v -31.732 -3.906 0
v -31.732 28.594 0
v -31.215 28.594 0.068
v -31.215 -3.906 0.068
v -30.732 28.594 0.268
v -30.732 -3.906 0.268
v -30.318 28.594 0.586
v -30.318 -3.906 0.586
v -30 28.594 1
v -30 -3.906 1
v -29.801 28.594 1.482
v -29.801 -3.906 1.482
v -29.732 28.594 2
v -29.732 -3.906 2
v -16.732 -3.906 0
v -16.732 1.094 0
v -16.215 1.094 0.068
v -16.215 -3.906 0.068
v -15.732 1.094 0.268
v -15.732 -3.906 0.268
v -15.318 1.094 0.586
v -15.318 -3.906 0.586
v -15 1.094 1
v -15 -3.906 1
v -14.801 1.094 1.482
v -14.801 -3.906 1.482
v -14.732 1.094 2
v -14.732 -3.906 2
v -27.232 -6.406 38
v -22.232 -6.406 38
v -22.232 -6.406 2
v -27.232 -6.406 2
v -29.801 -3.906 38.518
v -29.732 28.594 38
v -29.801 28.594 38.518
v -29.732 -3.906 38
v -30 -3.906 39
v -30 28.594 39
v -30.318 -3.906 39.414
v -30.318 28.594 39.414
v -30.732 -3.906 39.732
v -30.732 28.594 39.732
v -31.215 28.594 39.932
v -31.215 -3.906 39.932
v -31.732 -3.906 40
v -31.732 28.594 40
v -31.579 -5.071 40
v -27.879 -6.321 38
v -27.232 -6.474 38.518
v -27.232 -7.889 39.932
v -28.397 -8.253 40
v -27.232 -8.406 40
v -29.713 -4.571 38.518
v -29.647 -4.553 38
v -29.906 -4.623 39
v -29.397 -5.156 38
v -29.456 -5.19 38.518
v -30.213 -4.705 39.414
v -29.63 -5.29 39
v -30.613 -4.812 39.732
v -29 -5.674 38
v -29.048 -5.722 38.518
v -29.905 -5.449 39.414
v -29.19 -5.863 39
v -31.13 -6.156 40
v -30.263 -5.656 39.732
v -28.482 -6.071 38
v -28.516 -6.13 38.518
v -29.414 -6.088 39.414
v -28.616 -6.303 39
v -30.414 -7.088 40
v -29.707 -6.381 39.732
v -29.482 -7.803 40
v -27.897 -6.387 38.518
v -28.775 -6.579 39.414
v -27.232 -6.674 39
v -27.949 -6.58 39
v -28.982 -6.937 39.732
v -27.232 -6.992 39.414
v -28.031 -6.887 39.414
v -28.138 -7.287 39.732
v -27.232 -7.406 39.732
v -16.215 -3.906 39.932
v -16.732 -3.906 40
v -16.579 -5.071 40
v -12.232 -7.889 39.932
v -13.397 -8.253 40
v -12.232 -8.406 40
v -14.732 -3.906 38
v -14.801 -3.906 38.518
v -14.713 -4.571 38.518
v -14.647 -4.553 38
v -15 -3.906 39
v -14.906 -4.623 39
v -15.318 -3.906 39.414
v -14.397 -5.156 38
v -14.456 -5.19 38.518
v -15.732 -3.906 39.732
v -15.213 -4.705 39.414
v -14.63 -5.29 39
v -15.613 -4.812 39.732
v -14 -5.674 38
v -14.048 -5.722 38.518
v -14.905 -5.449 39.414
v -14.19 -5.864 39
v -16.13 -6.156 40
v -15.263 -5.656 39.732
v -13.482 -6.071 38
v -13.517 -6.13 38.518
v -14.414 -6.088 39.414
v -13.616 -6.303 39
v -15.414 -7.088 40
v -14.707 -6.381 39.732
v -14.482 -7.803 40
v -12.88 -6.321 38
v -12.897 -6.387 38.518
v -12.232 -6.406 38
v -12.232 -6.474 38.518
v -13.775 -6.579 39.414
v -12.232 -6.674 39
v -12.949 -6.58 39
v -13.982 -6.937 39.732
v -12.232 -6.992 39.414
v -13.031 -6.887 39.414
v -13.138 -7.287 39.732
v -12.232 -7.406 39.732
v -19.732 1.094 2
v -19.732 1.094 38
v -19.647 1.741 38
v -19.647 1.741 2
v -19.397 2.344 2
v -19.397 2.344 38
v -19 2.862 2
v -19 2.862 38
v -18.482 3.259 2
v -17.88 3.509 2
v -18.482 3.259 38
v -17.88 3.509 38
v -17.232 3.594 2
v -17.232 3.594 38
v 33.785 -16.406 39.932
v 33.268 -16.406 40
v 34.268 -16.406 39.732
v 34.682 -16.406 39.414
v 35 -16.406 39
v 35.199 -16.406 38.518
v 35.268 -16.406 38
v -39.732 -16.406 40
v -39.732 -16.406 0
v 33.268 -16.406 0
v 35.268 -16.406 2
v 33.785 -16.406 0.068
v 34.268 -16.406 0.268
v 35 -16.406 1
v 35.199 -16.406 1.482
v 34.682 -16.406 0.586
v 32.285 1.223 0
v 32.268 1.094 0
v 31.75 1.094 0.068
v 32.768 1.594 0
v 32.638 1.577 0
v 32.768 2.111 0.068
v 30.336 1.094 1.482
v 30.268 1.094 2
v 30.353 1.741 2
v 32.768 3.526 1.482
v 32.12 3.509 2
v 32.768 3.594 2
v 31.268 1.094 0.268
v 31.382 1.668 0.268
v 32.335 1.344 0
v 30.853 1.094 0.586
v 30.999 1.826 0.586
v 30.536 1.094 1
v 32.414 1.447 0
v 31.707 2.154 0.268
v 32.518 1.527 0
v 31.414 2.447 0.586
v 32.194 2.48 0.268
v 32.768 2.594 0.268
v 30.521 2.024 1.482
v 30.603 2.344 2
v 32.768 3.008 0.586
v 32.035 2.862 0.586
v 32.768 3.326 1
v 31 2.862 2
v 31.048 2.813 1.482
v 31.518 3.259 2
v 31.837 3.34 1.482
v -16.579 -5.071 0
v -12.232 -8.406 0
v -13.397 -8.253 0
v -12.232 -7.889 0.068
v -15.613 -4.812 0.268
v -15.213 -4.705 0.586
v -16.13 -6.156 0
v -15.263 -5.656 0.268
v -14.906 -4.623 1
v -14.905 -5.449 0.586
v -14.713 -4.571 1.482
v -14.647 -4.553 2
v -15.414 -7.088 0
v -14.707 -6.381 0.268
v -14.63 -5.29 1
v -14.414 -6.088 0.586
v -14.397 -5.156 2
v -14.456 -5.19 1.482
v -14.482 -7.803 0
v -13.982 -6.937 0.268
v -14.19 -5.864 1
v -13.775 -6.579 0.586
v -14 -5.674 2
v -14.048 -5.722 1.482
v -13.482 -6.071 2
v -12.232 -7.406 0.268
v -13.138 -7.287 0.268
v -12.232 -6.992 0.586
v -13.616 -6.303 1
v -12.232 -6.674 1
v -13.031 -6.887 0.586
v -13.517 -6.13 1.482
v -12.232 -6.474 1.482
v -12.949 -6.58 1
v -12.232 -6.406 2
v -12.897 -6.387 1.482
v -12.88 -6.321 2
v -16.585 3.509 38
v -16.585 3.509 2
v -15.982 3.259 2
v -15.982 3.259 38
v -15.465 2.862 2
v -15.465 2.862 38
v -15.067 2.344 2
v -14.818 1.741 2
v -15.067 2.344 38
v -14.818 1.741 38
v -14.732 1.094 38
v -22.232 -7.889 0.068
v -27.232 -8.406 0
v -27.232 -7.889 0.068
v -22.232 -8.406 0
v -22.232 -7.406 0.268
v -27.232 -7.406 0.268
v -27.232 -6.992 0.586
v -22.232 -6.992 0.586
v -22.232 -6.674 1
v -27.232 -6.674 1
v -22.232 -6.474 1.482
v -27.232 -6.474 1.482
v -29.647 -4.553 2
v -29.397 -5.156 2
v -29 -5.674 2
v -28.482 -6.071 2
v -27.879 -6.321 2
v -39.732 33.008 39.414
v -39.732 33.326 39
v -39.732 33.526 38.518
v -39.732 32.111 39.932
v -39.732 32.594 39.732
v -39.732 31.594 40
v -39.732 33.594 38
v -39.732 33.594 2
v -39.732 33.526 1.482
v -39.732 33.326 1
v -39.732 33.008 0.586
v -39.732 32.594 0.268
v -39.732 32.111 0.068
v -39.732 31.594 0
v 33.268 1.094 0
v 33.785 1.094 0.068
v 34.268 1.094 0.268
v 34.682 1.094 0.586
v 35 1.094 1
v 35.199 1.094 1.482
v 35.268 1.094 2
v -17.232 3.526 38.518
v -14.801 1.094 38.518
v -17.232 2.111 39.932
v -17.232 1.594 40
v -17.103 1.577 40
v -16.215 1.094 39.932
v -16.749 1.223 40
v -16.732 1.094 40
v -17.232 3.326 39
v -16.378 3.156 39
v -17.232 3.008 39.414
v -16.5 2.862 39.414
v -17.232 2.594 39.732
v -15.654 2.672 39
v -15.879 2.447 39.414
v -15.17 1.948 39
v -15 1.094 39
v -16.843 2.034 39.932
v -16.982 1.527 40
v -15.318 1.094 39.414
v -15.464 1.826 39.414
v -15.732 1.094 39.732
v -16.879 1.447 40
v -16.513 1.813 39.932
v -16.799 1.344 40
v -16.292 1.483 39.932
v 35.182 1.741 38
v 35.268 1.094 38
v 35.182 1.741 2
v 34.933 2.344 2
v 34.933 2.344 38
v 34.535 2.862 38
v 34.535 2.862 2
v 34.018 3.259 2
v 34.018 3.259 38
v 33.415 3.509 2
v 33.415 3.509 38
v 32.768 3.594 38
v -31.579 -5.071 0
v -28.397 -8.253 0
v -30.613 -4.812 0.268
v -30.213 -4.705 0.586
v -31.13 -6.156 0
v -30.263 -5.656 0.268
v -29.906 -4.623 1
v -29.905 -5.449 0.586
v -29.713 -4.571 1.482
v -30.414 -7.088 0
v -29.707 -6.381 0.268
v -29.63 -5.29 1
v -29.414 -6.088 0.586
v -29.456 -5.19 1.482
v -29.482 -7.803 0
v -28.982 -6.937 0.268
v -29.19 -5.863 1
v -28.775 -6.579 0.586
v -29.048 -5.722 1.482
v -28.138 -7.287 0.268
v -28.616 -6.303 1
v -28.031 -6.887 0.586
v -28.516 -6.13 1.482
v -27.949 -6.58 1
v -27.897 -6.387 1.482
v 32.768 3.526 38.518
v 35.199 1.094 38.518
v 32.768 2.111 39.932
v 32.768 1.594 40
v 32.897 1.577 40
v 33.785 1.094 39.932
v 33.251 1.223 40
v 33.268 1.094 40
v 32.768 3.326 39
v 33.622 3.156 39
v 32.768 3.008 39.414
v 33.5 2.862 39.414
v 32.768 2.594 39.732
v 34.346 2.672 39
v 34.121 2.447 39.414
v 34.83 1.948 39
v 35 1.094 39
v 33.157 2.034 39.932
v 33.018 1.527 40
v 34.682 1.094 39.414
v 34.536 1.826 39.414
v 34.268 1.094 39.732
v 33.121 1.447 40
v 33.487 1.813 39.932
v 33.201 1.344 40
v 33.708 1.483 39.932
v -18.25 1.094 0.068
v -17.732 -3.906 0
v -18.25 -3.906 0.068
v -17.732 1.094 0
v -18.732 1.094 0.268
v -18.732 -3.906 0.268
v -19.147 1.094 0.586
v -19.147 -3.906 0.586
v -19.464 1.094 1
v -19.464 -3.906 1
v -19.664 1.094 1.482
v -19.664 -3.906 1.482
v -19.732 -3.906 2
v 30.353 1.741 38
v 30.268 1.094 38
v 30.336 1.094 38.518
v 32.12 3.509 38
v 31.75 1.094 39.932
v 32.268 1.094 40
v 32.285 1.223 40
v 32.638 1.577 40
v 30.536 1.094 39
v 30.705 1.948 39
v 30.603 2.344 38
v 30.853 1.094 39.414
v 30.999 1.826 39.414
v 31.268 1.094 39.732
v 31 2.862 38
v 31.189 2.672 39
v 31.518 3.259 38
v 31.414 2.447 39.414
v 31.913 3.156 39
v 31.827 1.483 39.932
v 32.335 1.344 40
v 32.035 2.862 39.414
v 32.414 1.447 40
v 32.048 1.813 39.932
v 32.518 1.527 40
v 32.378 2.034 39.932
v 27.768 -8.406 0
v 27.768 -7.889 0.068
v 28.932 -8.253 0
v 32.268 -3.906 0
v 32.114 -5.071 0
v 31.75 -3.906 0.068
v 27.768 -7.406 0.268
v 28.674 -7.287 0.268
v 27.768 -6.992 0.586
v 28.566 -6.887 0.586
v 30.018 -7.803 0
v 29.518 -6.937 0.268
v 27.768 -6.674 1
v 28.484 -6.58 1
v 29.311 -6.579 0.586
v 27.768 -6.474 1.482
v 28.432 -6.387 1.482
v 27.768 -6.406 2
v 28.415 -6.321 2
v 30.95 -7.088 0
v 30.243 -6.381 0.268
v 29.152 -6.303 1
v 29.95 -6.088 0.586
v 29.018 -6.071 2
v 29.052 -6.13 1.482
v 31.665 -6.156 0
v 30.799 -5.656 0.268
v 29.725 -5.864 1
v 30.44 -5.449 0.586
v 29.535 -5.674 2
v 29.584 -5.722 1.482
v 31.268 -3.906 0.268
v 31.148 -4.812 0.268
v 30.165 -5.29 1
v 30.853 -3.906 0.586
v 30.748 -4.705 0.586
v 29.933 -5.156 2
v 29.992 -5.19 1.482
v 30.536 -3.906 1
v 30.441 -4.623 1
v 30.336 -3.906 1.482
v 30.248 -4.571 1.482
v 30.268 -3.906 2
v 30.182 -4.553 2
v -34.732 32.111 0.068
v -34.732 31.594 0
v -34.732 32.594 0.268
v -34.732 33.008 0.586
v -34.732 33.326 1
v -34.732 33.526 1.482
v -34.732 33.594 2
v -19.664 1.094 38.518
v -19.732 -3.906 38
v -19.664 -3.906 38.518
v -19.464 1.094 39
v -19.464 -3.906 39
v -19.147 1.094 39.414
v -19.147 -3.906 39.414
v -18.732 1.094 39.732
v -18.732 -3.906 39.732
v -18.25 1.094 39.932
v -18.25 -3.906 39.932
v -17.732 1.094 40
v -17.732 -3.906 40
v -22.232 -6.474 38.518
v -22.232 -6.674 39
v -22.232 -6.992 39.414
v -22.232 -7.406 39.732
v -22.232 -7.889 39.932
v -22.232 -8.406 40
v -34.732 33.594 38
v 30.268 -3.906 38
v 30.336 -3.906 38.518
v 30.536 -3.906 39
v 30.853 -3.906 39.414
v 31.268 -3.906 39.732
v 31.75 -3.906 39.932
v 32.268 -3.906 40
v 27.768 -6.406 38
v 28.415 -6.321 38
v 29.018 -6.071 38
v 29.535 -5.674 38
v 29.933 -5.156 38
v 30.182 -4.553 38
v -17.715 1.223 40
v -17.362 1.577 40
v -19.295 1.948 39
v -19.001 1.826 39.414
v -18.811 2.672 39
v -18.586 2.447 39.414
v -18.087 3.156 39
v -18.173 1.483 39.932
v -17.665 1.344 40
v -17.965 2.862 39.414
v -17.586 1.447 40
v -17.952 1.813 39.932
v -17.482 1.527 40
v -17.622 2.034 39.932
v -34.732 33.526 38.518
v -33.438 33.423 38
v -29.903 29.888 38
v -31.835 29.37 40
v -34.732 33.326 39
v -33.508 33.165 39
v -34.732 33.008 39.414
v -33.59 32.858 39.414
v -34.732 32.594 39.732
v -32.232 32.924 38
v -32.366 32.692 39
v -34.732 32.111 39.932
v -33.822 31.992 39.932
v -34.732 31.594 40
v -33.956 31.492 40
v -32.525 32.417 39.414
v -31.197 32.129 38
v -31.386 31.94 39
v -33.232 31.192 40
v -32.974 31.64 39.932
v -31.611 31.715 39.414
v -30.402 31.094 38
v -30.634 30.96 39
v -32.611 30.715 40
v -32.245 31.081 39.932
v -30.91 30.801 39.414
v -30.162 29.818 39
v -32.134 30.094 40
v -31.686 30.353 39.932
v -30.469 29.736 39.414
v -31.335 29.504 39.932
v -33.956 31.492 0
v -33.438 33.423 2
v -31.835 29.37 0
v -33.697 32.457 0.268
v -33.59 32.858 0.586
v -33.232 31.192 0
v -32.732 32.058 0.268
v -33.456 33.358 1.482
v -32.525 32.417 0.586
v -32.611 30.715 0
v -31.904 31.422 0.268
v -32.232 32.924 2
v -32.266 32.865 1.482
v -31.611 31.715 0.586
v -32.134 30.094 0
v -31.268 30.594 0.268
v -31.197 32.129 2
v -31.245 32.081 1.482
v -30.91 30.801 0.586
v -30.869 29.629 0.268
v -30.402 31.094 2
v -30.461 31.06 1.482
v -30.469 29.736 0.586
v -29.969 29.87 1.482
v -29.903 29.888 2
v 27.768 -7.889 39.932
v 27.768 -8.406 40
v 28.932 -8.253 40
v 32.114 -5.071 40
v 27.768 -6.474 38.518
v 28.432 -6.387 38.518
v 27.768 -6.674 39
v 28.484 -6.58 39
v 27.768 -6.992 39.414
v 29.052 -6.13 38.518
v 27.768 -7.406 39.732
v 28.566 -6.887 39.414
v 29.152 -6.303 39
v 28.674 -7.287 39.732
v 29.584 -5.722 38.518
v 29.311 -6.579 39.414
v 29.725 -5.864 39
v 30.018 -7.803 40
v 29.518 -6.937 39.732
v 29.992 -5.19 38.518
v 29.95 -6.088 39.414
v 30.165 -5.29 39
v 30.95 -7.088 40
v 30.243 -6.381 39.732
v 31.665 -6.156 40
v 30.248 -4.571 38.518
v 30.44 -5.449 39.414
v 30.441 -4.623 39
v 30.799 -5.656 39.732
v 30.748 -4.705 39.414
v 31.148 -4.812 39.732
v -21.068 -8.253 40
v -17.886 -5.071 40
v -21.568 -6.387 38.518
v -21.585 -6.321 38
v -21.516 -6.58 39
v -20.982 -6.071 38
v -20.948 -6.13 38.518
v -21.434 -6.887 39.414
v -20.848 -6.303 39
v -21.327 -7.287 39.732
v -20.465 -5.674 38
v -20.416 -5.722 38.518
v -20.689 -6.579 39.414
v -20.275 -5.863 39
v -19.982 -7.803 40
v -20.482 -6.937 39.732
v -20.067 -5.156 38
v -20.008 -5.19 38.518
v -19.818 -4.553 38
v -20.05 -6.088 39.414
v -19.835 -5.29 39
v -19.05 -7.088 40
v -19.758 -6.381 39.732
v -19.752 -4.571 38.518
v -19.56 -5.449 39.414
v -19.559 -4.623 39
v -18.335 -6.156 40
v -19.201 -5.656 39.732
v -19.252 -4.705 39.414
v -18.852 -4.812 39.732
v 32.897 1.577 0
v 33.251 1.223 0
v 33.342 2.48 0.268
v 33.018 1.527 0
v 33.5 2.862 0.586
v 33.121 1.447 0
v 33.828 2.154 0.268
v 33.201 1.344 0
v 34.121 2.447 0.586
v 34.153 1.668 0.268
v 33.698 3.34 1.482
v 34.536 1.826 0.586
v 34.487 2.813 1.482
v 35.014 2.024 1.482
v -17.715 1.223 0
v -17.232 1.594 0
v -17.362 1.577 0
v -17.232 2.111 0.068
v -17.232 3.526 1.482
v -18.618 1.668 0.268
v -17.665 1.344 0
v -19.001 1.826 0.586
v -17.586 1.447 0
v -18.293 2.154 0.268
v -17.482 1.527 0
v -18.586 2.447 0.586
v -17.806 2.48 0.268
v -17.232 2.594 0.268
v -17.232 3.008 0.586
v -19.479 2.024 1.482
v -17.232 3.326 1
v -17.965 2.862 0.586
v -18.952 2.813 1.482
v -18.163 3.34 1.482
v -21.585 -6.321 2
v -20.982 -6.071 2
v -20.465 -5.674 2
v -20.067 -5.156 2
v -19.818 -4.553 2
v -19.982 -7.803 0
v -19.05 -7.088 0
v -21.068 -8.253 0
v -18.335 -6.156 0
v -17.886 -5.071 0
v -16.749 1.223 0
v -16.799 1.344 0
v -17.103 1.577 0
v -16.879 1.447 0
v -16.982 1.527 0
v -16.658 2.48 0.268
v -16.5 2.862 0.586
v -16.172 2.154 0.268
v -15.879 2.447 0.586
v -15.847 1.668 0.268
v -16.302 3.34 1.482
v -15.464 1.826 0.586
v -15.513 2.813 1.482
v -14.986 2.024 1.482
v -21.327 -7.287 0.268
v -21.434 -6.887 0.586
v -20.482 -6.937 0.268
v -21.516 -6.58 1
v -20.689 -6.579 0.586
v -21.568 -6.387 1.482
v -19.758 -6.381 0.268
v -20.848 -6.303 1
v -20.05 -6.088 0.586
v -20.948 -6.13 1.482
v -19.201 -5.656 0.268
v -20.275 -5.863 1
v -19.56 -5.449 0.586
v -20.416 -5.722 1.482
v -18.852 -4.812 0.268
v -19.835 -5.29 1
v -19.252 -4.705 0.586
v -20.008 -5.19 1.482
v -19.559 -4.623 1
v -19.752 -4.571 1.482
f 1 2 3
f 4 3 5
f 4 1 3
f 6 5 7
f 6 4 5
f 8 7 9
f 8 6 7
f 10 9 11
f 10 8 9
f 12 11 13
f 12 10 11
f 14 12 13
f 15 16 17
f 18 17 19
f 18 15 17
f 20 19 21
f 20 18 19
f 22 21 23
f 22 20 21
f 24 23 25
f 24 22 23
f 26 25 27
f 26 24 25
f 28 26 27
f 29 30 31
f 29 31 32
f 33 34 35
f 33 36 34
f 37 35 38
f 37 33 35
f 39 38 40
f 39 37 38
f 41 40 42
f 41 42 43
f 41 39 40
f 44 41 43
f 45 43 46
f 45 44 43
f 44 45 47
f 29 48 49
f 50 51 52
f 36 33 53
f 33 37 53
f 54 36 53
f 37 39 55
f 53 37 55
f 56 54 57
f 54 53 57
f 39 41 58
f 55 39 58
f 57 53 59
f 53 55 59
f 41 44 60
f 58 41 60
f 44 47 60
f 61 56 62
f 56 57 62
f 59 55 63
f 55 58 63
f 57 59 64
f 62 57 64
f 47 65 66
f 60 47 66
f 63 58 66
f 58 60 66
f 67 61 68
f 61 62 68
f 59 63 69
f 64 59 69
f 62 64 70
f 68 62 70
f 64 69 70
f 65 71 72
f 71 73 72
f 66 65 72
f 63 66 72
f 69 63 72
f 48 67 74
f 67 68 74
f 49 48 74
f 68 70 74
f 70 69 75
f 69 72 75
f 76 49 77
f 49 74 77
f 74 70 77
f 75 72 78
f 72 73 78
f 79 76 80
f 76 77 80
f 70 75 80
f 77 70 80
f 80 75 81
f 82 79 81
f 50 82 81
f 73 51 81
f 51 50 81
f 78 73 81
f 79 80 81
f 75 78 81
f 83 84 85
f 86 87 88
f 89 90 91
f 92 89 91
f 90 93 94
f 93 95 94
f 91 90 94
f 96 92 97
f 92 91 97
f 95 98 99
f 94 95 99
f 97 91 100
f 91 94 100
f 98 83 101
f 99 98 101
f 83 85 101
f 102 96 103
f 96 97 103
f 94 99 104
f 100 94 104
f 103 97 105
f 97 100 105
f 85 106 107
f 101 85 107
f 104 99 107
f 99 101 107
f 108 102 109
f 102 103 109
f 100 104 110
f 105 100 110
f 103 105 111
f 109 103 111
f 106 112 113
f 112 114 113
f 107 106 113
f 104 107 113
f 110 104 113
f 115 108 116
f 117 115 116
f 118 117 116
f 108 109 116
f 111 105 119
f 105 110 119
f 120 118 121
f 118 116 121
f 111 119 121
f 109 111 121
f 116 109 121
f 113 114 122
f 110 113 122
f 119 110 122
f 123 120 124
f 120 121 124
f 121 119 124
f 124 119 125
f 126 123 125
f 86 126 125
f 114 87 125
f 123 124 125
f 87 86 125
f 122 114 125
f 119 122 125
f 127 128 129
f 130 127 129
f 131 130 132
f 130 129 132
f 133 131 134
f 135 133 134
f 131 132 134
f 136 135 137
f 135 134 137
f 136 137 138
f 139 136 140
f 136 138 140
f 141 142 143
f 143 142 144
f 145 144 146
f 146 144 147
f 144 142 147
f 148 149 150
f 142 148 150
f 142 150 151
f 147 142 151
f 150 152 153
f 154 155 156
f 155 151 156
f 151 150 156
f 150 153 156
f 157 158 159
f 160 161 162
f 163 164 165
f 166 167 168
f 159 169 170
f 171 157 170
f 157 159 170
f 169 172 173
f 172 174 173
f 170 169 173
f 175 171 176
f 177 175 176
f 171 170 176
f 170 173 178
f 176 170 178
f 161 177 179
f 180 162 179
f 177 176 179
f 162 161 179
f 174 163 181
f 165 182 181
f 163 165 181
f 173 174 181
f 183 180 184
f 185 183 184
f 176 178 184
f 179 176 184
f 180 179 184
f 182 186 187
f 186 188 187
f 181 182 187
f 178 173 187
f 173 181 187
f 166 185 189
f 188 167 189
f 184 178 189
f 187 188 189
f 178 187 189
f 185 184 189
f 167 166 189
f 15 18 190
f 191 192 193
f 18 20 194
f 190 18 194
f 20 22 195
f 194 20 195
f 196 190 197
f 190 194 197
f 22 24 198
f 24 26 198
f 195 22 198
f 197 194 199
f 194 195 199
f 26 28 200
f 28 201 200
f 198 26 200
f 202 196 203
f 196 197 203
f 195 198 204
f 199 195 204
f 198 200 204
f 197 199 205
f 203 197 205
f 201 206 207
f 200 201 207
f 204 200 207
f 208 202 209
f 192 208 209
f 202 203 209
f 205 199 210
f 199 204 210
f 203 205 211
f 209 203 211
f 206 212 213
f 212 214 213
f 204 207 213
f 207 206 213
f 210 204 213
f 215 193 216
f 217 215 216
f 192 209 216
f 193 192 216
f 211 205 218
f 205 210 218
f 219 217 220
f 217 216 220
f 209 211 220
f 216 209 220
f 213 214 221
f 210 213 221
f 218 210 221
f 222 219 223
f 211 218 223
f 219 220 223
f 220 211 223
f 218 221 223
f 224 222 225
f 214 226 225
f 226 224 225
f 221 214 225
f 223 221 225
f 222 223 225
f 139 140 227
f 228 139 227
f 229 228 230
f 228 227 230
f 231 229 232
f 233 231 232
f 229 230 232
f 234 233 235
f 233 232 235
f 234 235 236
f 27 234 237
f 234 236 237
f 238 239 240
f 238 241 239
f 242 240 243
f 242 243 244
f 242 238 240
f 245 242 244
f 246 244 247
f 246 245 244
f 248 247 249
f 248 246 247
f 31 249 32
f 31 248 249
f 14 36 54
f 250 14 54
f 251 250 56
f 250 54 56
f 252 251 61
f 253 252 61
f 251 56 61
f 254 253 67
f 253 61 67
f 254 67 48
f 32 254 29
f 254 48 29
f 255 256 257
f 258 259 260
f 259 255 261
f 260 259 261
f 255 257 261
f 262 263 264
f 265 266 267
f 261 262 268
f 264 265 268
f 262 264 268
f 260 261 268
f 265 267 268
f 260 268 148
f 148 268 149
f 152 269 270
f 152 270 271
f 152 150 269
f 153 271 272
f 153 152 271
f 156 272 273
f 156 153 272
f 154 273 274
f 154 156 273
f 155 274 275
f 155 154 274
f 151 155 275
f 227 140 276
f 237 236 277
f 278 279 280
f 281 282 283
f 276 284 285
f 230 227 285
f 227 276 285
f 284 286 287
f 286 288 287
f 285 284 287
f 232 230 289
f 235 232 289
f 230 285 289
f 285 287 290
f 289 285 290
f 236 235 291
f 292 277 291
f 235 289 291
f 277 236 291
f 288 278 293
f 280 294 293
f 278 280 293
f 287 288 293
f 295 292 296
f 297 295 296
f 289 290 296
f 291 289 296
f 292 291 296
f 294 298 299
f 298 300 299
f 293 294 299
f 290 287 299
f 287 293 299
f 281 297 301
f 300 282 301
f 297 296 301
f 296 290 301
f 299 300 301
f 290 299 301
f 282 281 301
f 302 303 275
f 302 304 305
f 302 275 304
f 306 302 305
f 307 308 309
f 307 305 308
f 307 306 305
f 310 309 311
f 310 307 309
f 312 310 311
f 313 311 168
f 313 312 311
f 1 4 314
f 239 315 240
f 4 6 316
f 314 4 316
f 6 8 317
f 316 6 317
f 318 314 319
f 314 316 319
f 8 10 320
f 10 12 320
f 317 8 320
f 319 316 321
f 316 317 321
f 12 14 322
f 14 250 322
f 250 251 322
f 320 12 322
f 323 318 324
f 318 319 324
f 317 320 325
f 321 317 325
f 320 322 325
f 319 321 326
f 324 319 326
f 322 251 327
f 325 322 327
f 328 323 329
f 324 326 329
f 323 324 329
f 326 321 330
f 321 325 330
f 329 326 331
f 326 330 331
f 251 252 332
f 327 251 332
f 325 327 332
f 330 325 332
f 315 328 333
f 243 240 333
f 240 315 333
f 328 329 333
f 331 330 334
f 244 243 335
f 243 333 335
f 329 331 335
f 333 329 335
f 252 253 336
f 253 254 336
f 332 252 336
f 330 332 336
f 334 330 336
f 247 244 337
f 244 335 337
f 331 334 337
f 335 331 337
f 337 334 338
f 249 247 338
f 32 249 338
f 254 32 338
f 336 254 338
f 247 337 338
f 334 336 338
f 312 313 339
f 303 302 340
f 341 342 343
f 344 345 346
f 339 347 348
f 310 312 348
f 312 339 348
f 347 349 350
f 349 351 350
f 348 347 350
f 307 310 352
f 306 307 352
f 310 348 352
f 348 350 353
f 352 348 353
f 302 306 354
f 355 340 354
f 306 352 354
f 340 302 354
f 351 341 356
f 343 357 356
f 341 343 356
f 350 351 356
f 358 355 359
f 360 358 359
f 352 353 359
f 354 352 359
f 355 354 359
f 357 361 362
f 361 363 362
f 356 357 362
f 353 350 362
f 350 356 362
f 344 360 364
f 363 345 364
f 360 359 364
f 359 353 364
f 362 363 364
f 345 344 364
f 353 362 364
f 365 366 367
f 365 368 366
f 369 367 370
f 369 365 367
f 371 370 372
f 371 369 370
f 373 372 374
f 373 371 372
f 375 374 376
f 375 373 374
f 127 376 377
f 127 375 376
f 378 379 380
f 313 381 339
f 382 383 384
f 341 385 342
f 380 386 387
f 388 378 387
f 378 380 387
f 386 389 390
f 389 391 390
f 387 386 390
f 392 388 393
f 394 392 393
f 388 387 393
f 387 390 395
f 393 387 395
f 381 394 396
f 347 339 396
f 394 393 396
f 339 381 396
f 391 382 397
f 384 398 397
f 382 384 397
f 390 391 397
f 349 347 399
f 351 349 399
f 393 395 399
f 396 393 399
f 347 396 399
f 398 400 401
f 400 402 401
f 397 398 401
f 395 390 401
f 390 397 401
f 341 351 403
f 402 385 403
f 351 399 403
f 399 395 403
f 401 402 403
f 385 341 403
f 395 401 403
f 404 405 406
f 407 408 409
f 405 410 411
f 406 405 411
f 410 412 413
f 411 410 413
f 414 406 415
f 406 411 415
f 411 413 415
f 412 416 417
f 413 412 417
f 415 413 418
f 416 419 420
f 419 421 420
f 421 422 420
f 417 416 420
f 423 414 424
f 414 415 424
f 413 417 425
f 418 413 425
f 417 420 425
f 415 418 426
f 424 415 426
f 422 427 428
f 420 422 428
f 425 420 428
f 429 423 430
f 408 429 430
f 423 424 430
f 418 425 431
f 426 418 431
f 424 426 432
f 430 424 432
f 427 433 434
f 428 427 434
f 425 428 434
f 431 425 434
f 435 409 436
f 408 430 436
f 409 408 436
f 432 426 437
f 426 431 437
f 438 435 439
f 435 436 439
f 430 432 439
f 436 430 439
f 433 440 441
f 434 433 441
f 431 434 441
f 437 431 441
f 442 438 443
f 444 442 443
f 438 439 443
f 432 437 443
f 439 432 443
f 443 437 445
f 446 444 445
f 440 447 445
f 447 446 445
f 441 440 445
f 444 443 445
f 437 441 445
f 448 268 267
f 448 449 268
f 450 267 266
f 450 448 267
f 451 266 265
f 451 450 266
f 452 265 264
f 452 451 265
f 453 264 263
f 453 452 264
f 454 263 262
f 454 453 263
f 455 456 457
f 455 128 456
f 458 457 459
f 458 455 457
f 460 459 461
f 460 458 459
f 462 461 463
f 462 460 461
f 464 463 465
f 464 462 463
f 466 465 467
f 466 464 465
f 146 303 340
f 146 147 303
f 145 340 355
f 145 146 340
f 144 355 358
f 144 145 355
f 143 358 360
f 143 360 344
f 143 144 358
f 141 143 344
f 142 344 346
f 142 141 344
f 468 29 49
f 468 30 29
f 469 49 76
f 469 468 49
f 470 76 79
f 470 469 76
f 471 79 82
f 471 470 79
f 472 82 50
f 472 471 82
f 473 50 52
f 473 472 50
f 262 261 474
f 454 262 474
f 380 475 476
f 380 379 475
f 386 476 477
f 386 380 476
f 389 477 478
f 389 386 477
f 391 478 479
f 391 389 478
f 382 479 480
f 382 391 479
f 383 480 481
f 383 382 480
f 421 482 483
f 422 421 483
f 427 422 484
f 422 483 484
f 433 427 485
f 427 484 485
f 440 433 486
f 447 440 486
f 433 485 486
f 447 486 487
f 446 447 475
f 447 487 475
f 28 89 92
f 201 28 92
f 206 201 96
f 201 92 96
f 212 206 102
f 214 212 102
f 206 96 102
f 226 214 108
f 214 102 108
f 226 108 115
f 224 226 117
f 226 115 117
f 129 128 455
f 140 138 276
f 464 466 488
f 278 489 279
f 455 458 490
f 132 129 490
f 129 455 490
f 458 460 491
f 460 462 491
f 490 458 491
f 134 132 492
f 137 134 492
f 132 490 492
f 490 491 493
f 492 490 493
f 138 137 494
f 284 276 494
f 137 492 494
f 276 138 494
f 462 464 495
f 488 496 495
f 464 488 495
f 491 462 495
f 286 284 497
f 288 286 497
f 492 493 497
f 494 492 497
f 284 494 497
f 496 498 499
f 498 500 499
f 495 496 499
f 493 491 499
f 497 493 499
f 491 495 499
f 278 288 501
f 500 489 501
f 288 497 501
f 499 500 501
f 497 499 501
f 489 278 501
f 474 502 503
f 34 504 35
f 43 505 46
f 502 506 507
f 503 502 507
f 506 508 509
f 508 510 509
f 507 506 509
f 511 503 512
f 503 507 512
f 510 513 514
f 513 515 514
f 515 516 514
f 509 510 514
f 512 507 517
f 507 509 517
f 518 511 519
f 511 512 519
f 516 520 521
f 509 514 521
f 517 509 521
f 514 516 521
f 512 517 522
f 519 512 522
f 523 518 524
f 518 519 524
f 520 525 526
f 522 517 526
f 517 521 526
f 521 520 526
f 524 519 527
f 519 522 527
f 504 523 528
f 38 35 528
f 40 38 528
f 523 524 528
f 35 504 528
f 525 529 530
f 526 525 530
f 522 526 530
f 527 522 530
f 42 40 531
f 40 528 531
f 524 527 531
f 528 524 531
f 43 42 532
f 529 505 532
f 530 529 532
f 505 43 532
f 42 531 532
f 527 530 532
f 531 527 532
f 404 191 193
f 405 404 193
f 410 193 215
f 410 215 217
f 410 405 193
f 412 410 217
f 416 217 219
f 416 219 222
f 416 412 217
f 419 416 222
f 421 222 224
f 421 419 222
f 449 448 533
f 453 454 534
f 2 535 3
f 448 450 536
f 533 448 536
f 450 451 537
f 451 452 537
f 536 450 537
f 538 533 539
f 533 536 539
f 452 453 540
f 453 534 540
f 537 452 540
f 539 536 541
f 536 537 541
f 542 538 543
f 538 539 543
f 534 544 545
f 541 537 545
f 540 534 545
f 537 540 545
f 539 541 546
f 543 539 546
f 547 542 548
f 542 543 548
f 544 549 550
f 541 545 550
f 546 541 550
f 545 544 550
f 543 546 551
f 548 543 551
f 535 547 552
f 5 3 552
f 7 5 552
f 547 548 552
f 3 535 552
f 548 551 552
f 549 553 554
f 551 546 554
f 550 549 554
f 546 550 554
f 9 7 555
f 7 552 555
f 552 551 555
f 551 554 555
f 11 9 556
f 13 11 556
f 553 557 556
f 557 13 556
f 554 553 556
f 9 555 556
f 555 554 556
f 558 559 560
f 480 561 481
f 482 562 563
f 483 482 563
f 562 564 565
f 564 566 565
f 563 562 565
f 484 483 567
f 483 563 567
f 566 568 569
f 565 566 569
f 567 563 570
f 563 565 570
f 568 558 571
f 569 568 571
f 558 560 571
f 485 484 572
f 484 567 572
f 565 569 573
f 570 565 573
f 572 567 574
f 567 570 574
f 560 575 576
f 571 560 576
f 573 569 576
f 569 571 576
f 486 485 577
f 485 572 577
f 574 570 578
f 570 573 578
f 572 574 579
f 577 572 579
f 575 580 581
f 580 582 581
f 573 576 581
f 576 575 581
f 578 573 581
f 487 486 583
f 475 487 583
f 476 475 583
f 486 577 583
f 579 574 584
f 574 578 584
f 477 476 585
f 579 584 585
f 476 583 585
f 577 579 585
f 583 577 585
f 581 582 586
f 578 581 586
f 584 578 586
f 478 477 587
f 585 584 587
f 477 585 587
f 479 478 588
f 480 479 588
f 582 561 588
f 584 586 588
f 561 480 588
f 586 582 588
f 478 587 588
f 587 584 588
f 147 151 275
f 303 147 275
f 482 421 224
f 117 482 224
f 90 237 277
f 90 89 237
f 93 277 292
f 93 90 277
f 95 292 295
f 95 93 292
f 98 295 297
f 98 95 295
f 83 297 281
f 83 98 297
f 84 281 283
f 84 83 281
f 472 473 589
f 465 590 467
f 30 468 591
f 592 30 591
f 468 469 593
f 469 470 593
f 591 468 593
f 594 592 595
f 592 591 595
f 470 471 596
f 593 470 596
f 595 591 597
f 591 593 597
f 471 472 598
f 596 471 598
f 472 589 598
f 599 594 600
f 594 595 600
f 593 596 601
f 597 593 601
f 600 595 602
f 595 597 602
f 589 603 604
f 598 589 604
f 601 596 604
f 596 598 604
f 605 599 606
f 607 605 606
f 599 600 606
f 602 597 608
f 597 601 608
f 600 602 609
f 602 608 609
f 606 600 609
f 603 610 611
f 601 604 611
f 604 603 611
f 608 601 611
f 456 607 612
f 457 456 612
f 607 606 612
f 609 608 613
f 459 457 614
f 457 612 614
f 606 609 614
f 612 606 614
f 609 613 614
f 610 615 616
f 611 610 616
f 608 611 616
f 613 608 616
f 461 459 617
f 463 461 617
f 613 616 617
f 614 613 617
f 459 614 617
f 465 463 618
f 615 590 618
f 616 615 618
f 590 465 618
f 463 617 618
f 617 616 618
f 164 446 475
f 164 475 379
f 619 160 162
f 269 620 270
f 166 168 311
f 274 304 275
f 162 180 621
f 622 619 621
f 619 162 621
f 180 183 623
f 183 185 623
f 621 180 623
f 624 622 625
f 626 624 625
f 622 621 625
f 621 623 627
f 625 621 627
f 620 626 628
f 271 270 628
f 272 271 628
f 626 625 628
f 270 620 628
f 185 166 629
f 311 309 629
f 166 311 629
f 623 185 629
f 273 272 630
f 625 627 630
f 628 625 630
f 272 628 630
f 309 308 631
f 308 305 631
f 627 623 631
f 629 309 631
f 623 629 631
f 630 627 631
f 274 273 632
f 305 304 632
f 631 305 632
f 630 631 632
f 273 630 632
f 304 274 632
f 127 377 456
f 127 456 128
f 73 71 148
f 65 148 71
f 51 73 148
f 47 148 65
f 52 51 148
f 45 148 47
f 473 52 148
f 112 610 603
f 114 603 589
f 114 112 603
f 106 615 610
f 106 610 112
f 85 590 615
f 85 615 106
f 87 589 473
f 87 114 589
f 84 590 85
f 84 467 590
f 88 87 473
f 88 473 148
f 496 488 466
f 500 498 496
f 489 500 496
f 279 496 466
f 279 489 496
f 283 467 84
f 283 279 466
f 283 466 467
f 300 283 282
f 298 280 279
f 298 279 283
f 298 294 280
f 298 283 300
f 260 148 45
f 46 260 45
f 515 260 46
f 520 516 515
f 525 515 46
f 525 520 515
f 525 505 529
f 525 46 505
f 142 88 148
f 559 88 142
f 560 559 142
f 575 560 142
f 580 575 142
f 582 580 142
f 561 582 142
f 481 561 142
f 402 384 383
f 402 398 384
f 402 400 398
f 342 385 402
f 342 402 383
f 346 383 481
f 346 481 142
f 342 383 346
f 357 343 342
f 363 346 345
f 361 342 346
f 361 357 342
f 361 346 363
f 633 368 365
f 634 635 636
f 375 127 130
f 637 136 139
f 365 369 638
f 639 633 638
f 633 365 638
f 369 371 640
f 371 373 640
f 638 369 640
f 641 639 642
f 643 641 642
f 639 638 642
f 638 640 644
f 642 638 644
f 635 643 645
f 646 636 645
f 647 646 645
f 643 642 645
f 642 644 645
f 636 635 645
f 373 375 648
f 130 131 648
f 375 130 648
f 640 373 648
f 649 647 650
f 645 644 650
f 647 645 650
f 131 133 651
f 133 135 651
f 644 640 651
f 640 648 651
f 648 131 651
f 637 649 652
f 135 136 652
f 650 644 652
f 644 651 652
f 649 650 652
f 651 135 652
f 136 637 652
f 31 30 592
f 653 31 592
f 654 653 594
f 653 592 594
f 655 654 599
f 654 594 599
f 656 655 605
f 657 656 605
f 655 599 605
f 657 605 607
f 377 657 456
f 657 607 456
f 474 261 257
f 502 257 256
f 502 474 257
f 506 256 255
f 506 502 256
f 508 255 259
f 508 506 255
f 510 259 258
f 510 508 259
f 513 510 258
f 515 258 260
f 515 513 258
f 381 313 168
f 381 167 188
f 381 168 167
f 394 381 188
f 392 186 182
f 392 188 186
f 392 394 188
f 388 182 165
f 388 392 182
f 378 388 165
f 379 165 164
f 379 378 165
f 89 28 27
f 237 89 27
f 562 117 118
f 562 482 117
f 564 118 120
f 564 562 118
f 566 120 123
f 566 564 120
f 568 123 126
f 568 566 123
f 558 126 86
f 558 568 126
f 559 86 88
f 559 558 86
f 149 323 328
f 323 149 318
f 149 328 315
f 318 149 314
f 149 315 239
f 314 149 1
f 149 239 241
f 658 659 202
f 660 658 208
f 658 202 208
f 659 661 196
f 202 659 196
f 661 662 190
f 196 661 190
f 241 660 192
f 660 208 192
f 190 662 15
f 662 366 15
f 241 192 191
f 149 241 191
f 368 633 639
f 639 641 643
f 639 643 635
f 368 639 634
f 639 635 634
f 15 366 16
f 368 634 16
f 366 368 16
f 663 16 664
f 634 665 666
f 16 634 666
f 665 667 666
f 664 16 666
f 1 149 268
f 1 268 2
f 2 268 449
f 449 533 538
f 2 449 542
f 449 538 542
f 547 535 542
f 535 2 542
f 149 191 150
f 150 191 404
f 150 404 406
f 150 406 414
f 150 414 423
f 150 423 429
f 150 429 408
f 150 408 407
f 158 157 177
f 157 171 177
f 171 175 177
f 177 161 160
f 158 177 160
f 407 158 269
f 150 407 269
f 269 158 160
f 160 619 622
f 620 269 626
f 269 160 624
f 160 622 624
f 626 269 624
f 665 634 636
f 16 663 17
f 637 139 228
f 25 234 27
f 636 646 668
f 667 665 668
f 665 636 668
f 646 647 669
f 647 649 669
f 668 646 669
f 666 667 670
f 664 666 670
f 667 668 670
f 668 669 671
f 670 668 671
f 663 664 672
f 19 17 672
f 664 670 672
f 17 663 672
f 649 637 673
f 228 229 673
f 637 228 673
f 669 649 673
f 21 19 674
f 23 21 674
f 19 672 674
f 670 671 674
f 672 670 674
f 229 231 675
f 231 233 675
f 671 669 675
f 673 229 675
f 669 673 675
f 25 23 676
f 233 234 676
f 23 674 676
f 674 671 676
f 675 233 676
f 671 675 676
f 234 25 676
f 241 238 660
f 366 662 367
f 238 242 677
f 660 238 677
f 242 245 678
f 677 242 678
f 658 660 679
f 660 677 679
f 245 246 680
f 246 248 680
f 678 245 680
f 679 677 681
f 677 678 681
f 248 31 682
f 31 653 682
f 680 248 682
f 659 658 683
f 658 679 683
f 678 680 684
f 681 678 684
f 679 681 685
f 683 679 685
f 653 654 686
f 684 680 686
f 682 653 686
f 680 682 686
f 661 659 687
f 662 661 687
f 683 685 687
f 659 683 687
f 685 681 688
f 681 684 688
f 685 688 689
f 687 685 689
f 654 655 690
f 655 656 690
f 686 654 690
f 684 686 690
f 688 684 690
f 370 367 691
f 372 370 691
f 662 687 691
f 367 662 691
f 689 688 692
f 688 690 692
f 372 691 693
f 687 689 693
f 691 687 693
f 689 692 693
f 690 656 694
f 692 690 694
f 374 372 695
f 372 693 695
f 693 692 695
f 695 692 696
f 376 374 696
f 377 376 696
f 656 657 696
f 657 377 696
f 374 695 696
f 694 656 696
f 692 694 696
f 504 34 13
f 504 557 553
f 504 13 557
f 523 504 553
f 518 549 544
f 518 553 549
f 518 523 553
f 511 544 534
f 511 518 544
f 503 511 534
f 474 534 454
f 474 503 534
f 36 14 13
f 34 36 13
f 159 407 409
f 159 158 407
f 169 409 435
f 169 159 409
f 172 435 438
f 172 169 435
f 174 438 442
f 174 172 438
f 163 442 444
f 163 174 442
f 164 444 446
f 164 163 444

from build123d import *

# Parameters (mm, degrees)
SKETCH_1_W      = 10
SKETCH_1_H      = 40
SKETCH_1_W_2    = 5
SKETCH_1_H_2    = 10
EXTRUDE_1_DEPTH = 40
FILLET_2_R      = 5
FILLET_3_R      = 2.5
FILLET_4_R      = 2.5
FILLET_6_R      = 2


with BuildPart() as part:
    # 草圖1 → 填料-伸長1 (new body)
    with BuildSketch(Plane.XY):
        with Locations((-34.732391425, 13.59375)):
            Rectangle(SKETCH_1_W, SKETCH_1_H)
        Polygon((-29.732391425, -6.40625), (-39.732391425, -6.40625), (-39.732391425, -16.40625), (35.267608575, -16.40625), (35.267608575, -6.40625), (30.267608575, -6.40625), (-14.732391425, -6.40625), (-19.732391425, -6.40625), align=None)
        with Locations((-17.232391425, -1.40625)):
            Rectangle(SKETCH_1_W_2, SKETCH_1_H_2)
        with Locations((32.767608575, -1.40625)):
            Rectangle(SKETCH_1_W_2, SKETCH_1_H_2)
    extrude(amount=EXTRUDE_1_DEPTH)

    # 圓角2
    fillet_2_edges = [part.edges().sort_by_distance(p)[0] for p in [
        (-29.732391425, 33.59375, 20),
    ]]
    fillet(fillet_2_edges, radius=FILLET_2_R)

    # 圓角3
    fillet_3_edges = [part.edges().sort_by_distance(p)[0] for p in [
        (-29.732391425, -6.40625, 20),
        (-19.732391425, -6.40625, 20),
    ]]
    fillet(fillet_3_edges, radius=FILLET_3_R)

    # 圓角4
    fillet_4_edges = [part.edges().sort_by_distance(p)[0] for p in [
        (30.267608575, -6.40625, 20),
        (30.267608575, 3.59375, 20),
        (35.267608575, 3.59375, 20),
        (-14.732391425, -6.40625, 20),
        (-14.732391425, 3.59375, 20),
        (-19.732391425, 3.59375, 20),
    ]]
    fillet(fillet_4_edges, radius=FILLET_4_R - 0.0001)  # a hair under: the kernel refuses the full size

    # 圓角6
    fillet_6_edges = [part.edges().sort_by_distance(p)[0] for p in [
        (-37.232391425, 33.59375, 40),
        (-37.232391425, 33.59375, 0),
        (-29.732391425, 12.34375, 0),
        (-31.196857519, 32.129283906, 0),
        (-29.732391425, 12.34375, 40),
        (-31.196857519, 32.129283906, 40),
        (-19.732391425, -1.4062, 0),
        (-19.732391425, -1.4062, 40),
        (-24.732391425, -6.40625, 0),
        (-24.732391425, -6.40625, 40),
        (-20.464624472, -5.674016953, 40),
        (-20.464624472, -5.674016953, 0),
        (-29.000158378, -5.674016953, 0),
        (-29.000158378, -5.674016953, 40),
        (30.267608575, -1.40625, 0),
        (30.267608575, -1.40625, 40),
        (7.767608575, -6.40625, 0),
        (7.767608575, -6.40625, 40),
        (-14.732391425, -1.40625, 0),
        (35.267608575, -7.6562, 0),
        (-19.000187668, 2.861546242, 0),
        (-15.464595183, 2.861546242, 0),
        (34.535404817, 2.861546242, 0),
        (30.999812332, 2.861546242, 0),
        (35.267608575, -7.6562, 40),
        (-14.732391425, -1.40625, 40),
        (-19.000187668, 2.861546242, 40),
        (-15.464595183, 2.861546242, 40),
        (34.535404817, 2.861546242, 40),
        (30.999812332, 2.861546242, 40),
        (29.535404817, -5.674046242, 40),
        (29.535404817, -5.674046242, 0),
        (-14.000187668, -5.674046242, 40),
        (-14.000187668, -5.674046242, 0),
    ]]
    fillet(fillet_6_edges, radius=FILLET_6_R)


solid = part.part
